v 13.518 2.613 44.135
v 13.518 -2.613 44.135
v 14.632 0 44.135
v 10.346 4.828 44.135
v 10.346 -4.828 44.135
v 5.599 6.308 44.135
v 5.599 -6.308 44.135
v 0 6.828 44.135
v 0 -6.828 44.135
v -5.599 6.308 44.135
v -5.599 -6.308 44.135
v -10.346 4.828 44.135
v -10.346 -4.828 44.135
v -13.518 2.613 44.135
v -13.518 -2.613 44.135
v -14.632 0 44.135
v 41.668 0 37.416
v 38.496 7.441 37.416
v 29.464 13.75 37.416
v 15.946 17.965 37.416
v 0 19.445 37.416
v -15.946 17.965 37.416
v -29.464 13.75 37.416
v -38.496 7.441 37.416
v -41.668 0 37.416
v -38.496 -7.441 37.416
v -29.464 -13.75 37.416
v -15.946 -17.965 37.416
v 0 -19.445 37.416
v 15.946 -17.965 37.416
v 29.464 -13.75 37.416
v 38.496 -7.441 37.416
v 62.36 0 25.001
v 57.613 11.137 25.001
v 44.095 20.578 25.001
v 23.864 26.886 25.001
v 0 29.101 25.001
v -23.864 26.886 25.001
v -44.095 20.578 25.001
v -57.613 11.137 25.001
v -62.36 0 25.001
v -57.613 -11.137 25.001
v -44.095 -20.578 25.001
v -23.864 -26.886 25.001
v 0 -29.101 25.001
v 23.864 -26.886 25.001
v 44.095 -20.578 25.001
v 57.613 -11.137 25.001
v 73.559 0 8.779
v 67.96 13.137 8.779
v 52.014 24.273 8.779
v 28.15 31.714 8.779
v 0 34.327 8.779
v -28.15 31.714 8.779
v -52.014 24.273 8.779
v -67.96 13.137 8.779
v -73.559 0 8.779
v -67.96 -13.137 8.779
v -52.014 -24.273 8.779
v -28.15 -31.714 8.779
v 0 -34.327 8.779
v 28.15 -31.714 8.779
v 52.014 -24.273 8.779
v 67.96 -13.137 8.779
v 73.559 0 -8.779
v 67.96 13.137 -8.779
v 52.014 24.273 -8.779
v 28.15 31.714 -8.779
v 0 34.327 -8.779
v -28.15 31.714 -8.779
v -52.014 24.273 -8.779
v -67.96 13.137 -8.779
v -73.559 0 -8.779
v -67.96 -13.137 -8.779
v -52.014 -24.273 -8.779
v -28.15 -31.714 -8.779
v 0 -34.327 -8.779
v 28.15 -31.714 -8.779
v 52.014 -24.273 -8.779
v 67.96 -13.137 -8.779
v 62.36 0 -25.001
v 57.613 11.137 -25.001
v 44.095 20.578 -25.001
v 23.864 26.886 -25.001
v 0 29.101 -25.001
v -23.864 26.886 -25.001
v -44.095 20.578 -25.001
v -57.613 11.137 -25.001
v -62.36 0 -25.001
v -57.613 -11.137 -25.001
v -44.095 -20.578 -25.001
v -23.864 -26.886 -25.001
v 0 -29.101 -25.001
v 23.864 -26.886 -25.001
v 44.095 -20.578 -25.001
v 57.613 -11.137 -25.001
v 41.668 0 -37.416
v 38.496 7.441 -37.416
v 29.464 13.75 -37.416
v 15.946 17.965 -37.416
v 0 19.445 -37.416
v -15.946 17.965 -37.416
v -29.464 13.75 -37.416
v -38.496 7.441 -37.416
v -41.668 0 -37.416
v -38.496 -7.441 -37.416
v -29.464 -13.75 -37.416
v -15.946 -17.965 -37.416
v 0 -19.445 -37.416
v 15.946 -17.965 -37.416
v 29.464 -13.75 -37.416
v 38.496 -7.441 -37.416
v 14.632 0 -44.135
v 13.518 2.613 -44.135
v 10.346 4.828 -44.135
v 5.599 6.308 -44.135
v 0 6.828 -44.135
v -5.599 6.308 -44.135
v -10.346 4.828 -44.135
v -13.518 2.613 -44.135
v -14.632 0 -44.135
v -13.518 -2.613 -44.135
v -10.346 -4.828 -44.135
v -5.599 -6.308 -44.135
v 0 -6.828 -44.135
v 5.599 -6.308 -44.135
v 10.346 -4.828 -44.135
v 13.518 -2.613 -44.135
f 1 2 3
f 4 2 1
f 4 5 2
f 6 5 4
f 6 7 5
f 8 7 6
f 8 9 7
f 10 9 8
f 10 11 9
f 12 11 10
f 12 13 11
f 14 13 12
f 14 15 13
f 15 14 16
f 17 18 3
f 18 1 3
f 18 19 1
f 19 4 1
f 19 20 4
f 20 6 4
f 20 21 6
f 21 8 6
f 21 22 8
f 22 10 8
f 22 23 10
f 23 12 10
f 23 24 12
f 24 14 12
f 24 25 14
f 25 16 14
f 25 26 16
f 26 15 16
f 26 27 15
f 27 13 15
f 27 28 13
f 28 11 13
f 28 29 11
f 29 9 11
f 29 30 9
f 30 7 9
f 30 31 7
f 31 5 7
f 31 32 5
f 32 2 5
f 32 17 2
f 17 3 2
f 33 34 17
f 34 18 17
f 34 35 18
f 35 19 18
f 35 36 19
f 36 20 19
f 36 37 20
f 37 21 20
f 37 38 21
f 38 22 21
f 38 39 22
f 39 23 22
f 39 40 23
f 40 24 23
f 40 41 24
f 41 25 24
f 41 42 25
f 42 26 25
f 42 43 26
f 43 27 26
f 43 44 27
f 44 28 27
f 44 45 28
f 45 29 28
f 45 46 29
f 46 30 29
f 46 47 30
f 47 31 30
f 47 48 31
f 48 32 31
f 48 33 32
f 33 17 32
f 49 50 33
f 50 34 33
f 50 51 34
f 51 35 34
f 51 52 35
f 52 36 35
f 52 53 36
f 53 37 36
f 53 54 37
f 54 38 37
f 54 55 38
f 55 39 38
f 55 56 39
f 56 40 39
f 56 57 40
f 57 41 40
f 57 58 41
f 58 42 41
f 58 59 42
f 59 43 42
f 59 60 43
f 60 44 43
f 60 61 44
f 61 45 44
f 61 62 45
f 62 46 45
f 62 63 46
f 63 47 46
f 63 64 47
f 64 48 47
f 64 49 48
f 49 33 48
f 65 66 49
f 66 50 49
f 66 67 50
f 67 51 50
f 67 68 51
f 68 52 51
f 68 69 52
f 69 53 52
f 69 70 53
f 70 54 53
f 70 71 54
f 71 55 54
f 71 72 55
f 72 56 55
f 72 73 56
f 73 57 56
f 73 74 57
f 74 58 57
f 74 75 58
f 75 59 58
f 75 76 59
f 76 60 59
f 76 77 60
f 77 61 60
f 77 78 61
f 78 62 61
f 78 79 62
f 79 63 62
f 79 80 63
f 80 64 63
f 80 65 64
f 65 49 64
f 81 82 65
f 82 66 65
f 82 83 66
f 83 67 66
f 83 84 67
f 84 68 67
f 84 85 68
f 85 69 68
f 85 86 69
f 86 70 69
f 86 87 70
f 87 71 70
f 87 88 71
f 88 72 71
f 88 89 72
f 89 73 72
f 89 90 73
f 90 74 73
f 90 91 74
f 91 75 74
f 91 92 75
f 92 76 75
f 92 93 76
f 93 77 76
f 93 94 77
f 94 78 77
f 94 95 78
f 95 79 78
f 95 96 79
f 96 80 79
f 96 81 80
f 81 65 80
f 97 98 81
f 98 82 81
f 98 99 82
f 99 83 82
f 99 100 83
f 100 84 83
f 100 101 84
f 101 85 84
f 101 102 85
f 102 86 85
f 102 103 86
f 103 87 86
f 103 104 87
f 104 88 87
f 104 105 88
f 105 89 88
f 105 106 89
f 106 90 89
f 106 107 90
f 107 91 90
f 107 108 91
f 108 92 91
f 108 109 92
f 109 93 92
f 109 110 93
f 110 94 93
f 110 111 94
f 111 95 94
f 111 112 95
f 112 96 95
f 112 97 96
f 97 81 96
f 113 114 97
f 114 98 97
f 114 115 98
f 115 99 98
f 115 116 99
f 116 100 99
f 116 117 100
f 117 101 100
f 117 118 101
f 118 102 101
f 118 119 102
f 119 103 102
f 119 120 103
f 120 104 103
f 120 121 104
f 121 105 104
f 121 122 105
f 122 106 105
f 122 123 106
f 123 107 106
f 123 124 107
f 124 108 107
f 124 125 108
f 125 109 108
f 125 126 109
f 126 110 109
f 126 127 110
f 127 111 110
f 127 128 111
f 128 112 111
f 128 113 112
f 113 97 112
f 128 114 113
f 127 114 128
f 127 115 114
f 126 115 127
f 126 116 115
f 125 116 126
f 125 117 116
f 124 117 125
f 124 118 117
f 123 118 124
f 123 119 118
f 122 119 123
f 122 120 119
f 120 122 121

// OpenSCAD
// Generated by SolidPython 1.0.1 on 2020-07-29 00:46:51


scale(v = [15, 7, 9]) {
	sphere(r = 5);
}
/***********************************************
*********      SolidPython code:      **********
************************************************
 
# import packages: SolidPython
from solid import *
from solid.utils import *
from itertools import chain, combinations, permutations


class Resize:

    def __init__(self, scad_file):
        self.scad_file = scad_file
        #self.scad_file = import_scad(scad_file)
        # cone/cylinder param:
        self.r1 = 0
        self.r2 = 0
        self.h = 0
        # rectangular prism param:
        self.w = 0
        self.l = 0
        # ellipse param:
        self.r = 0

    # import OpenScad code (file name corresponds to shape)


    # classify shape + parameters
    def assign(self, param1, param2, param3):
        if self.scad_file == 'cone.scad':
            self.r1 = param1
            self.r2 = param2
            self.h = param3
        elif self.scad_file == 'cylinder.scad':
            self.r1 = param1
            self.r2 = param2
            self.h = param3
        elif self.scad_file == 'rectangularPrism.scad':
            self.h = param1
            self.l = param2
            self.w = param3
        else:
            self.r = param1
            self.h = param2

    # resize parameters
    def iterate(self):
        x = range(3, 20, 2)
        i = 1
        if self.scad_file == 'cone.scad':
            tempList = list(permutations(x, 2))
            for temp in tempList:
                param1 = temp[0]
                param2 = temp[1]
                filepath = 'produced_scad_files/' + 'cone' + str(param1) + '_' + str(param2) + '_' + '.scad'
                scad_render_to_file(cylinder(h=param1, r1=param2, r2=0), filepath)

        elif self.scad_file == 'cylinder.scad':
            tempList = list(permutations(x, 3))
            for temp in tempList:
                param1 = temp[0]
                param2 = temp[1]
                filepath = 'produced_scad_files/' + 'cylinder' + str(param1) + '_' + str(param2) + '_' + '.scad'
                scad_render_to_file(cylinder(h=param1, r1=param2, r2=param2), filepath)

        elif self.scad_file == 'rectangularPrism.scad':
            tempList = list(permutations(x, 3))
            for temp in tempList:
                param1 = temp[0]
                param2 = temp[1]
                param3 = temp[2]
                filepath = 'produced_scad_files/' + 'rectangularPrism' + str(param1) + '_' + str(param2) + '_' + str(
                    param3) + '.scad'
                scad_render_to_file(cube(size=(param1, param2, param3)), filepath)

        elif self.scad_file == 'ellipse.scad':
            tempList = list(permutations(x, 4))
            for temp in tempList:
                param1 = temp[0]
                param2 = temp[1]
                param3 = temp[2]
                param4 = temp[3]
                filepath = 'produced_scad_files/' + 'ellipse' + str(param1) + '_' + str(param2) + '_' + str(param3) + '_' + str(param4) + '.scad'
                scad_render_to_file(scale([param1, param2, param3])(sphere(r=param4)), filepath)

    def render_to_scadfile(self):
        scad_render_to_file(scad, 'example.scad') 
 
************************************************/
